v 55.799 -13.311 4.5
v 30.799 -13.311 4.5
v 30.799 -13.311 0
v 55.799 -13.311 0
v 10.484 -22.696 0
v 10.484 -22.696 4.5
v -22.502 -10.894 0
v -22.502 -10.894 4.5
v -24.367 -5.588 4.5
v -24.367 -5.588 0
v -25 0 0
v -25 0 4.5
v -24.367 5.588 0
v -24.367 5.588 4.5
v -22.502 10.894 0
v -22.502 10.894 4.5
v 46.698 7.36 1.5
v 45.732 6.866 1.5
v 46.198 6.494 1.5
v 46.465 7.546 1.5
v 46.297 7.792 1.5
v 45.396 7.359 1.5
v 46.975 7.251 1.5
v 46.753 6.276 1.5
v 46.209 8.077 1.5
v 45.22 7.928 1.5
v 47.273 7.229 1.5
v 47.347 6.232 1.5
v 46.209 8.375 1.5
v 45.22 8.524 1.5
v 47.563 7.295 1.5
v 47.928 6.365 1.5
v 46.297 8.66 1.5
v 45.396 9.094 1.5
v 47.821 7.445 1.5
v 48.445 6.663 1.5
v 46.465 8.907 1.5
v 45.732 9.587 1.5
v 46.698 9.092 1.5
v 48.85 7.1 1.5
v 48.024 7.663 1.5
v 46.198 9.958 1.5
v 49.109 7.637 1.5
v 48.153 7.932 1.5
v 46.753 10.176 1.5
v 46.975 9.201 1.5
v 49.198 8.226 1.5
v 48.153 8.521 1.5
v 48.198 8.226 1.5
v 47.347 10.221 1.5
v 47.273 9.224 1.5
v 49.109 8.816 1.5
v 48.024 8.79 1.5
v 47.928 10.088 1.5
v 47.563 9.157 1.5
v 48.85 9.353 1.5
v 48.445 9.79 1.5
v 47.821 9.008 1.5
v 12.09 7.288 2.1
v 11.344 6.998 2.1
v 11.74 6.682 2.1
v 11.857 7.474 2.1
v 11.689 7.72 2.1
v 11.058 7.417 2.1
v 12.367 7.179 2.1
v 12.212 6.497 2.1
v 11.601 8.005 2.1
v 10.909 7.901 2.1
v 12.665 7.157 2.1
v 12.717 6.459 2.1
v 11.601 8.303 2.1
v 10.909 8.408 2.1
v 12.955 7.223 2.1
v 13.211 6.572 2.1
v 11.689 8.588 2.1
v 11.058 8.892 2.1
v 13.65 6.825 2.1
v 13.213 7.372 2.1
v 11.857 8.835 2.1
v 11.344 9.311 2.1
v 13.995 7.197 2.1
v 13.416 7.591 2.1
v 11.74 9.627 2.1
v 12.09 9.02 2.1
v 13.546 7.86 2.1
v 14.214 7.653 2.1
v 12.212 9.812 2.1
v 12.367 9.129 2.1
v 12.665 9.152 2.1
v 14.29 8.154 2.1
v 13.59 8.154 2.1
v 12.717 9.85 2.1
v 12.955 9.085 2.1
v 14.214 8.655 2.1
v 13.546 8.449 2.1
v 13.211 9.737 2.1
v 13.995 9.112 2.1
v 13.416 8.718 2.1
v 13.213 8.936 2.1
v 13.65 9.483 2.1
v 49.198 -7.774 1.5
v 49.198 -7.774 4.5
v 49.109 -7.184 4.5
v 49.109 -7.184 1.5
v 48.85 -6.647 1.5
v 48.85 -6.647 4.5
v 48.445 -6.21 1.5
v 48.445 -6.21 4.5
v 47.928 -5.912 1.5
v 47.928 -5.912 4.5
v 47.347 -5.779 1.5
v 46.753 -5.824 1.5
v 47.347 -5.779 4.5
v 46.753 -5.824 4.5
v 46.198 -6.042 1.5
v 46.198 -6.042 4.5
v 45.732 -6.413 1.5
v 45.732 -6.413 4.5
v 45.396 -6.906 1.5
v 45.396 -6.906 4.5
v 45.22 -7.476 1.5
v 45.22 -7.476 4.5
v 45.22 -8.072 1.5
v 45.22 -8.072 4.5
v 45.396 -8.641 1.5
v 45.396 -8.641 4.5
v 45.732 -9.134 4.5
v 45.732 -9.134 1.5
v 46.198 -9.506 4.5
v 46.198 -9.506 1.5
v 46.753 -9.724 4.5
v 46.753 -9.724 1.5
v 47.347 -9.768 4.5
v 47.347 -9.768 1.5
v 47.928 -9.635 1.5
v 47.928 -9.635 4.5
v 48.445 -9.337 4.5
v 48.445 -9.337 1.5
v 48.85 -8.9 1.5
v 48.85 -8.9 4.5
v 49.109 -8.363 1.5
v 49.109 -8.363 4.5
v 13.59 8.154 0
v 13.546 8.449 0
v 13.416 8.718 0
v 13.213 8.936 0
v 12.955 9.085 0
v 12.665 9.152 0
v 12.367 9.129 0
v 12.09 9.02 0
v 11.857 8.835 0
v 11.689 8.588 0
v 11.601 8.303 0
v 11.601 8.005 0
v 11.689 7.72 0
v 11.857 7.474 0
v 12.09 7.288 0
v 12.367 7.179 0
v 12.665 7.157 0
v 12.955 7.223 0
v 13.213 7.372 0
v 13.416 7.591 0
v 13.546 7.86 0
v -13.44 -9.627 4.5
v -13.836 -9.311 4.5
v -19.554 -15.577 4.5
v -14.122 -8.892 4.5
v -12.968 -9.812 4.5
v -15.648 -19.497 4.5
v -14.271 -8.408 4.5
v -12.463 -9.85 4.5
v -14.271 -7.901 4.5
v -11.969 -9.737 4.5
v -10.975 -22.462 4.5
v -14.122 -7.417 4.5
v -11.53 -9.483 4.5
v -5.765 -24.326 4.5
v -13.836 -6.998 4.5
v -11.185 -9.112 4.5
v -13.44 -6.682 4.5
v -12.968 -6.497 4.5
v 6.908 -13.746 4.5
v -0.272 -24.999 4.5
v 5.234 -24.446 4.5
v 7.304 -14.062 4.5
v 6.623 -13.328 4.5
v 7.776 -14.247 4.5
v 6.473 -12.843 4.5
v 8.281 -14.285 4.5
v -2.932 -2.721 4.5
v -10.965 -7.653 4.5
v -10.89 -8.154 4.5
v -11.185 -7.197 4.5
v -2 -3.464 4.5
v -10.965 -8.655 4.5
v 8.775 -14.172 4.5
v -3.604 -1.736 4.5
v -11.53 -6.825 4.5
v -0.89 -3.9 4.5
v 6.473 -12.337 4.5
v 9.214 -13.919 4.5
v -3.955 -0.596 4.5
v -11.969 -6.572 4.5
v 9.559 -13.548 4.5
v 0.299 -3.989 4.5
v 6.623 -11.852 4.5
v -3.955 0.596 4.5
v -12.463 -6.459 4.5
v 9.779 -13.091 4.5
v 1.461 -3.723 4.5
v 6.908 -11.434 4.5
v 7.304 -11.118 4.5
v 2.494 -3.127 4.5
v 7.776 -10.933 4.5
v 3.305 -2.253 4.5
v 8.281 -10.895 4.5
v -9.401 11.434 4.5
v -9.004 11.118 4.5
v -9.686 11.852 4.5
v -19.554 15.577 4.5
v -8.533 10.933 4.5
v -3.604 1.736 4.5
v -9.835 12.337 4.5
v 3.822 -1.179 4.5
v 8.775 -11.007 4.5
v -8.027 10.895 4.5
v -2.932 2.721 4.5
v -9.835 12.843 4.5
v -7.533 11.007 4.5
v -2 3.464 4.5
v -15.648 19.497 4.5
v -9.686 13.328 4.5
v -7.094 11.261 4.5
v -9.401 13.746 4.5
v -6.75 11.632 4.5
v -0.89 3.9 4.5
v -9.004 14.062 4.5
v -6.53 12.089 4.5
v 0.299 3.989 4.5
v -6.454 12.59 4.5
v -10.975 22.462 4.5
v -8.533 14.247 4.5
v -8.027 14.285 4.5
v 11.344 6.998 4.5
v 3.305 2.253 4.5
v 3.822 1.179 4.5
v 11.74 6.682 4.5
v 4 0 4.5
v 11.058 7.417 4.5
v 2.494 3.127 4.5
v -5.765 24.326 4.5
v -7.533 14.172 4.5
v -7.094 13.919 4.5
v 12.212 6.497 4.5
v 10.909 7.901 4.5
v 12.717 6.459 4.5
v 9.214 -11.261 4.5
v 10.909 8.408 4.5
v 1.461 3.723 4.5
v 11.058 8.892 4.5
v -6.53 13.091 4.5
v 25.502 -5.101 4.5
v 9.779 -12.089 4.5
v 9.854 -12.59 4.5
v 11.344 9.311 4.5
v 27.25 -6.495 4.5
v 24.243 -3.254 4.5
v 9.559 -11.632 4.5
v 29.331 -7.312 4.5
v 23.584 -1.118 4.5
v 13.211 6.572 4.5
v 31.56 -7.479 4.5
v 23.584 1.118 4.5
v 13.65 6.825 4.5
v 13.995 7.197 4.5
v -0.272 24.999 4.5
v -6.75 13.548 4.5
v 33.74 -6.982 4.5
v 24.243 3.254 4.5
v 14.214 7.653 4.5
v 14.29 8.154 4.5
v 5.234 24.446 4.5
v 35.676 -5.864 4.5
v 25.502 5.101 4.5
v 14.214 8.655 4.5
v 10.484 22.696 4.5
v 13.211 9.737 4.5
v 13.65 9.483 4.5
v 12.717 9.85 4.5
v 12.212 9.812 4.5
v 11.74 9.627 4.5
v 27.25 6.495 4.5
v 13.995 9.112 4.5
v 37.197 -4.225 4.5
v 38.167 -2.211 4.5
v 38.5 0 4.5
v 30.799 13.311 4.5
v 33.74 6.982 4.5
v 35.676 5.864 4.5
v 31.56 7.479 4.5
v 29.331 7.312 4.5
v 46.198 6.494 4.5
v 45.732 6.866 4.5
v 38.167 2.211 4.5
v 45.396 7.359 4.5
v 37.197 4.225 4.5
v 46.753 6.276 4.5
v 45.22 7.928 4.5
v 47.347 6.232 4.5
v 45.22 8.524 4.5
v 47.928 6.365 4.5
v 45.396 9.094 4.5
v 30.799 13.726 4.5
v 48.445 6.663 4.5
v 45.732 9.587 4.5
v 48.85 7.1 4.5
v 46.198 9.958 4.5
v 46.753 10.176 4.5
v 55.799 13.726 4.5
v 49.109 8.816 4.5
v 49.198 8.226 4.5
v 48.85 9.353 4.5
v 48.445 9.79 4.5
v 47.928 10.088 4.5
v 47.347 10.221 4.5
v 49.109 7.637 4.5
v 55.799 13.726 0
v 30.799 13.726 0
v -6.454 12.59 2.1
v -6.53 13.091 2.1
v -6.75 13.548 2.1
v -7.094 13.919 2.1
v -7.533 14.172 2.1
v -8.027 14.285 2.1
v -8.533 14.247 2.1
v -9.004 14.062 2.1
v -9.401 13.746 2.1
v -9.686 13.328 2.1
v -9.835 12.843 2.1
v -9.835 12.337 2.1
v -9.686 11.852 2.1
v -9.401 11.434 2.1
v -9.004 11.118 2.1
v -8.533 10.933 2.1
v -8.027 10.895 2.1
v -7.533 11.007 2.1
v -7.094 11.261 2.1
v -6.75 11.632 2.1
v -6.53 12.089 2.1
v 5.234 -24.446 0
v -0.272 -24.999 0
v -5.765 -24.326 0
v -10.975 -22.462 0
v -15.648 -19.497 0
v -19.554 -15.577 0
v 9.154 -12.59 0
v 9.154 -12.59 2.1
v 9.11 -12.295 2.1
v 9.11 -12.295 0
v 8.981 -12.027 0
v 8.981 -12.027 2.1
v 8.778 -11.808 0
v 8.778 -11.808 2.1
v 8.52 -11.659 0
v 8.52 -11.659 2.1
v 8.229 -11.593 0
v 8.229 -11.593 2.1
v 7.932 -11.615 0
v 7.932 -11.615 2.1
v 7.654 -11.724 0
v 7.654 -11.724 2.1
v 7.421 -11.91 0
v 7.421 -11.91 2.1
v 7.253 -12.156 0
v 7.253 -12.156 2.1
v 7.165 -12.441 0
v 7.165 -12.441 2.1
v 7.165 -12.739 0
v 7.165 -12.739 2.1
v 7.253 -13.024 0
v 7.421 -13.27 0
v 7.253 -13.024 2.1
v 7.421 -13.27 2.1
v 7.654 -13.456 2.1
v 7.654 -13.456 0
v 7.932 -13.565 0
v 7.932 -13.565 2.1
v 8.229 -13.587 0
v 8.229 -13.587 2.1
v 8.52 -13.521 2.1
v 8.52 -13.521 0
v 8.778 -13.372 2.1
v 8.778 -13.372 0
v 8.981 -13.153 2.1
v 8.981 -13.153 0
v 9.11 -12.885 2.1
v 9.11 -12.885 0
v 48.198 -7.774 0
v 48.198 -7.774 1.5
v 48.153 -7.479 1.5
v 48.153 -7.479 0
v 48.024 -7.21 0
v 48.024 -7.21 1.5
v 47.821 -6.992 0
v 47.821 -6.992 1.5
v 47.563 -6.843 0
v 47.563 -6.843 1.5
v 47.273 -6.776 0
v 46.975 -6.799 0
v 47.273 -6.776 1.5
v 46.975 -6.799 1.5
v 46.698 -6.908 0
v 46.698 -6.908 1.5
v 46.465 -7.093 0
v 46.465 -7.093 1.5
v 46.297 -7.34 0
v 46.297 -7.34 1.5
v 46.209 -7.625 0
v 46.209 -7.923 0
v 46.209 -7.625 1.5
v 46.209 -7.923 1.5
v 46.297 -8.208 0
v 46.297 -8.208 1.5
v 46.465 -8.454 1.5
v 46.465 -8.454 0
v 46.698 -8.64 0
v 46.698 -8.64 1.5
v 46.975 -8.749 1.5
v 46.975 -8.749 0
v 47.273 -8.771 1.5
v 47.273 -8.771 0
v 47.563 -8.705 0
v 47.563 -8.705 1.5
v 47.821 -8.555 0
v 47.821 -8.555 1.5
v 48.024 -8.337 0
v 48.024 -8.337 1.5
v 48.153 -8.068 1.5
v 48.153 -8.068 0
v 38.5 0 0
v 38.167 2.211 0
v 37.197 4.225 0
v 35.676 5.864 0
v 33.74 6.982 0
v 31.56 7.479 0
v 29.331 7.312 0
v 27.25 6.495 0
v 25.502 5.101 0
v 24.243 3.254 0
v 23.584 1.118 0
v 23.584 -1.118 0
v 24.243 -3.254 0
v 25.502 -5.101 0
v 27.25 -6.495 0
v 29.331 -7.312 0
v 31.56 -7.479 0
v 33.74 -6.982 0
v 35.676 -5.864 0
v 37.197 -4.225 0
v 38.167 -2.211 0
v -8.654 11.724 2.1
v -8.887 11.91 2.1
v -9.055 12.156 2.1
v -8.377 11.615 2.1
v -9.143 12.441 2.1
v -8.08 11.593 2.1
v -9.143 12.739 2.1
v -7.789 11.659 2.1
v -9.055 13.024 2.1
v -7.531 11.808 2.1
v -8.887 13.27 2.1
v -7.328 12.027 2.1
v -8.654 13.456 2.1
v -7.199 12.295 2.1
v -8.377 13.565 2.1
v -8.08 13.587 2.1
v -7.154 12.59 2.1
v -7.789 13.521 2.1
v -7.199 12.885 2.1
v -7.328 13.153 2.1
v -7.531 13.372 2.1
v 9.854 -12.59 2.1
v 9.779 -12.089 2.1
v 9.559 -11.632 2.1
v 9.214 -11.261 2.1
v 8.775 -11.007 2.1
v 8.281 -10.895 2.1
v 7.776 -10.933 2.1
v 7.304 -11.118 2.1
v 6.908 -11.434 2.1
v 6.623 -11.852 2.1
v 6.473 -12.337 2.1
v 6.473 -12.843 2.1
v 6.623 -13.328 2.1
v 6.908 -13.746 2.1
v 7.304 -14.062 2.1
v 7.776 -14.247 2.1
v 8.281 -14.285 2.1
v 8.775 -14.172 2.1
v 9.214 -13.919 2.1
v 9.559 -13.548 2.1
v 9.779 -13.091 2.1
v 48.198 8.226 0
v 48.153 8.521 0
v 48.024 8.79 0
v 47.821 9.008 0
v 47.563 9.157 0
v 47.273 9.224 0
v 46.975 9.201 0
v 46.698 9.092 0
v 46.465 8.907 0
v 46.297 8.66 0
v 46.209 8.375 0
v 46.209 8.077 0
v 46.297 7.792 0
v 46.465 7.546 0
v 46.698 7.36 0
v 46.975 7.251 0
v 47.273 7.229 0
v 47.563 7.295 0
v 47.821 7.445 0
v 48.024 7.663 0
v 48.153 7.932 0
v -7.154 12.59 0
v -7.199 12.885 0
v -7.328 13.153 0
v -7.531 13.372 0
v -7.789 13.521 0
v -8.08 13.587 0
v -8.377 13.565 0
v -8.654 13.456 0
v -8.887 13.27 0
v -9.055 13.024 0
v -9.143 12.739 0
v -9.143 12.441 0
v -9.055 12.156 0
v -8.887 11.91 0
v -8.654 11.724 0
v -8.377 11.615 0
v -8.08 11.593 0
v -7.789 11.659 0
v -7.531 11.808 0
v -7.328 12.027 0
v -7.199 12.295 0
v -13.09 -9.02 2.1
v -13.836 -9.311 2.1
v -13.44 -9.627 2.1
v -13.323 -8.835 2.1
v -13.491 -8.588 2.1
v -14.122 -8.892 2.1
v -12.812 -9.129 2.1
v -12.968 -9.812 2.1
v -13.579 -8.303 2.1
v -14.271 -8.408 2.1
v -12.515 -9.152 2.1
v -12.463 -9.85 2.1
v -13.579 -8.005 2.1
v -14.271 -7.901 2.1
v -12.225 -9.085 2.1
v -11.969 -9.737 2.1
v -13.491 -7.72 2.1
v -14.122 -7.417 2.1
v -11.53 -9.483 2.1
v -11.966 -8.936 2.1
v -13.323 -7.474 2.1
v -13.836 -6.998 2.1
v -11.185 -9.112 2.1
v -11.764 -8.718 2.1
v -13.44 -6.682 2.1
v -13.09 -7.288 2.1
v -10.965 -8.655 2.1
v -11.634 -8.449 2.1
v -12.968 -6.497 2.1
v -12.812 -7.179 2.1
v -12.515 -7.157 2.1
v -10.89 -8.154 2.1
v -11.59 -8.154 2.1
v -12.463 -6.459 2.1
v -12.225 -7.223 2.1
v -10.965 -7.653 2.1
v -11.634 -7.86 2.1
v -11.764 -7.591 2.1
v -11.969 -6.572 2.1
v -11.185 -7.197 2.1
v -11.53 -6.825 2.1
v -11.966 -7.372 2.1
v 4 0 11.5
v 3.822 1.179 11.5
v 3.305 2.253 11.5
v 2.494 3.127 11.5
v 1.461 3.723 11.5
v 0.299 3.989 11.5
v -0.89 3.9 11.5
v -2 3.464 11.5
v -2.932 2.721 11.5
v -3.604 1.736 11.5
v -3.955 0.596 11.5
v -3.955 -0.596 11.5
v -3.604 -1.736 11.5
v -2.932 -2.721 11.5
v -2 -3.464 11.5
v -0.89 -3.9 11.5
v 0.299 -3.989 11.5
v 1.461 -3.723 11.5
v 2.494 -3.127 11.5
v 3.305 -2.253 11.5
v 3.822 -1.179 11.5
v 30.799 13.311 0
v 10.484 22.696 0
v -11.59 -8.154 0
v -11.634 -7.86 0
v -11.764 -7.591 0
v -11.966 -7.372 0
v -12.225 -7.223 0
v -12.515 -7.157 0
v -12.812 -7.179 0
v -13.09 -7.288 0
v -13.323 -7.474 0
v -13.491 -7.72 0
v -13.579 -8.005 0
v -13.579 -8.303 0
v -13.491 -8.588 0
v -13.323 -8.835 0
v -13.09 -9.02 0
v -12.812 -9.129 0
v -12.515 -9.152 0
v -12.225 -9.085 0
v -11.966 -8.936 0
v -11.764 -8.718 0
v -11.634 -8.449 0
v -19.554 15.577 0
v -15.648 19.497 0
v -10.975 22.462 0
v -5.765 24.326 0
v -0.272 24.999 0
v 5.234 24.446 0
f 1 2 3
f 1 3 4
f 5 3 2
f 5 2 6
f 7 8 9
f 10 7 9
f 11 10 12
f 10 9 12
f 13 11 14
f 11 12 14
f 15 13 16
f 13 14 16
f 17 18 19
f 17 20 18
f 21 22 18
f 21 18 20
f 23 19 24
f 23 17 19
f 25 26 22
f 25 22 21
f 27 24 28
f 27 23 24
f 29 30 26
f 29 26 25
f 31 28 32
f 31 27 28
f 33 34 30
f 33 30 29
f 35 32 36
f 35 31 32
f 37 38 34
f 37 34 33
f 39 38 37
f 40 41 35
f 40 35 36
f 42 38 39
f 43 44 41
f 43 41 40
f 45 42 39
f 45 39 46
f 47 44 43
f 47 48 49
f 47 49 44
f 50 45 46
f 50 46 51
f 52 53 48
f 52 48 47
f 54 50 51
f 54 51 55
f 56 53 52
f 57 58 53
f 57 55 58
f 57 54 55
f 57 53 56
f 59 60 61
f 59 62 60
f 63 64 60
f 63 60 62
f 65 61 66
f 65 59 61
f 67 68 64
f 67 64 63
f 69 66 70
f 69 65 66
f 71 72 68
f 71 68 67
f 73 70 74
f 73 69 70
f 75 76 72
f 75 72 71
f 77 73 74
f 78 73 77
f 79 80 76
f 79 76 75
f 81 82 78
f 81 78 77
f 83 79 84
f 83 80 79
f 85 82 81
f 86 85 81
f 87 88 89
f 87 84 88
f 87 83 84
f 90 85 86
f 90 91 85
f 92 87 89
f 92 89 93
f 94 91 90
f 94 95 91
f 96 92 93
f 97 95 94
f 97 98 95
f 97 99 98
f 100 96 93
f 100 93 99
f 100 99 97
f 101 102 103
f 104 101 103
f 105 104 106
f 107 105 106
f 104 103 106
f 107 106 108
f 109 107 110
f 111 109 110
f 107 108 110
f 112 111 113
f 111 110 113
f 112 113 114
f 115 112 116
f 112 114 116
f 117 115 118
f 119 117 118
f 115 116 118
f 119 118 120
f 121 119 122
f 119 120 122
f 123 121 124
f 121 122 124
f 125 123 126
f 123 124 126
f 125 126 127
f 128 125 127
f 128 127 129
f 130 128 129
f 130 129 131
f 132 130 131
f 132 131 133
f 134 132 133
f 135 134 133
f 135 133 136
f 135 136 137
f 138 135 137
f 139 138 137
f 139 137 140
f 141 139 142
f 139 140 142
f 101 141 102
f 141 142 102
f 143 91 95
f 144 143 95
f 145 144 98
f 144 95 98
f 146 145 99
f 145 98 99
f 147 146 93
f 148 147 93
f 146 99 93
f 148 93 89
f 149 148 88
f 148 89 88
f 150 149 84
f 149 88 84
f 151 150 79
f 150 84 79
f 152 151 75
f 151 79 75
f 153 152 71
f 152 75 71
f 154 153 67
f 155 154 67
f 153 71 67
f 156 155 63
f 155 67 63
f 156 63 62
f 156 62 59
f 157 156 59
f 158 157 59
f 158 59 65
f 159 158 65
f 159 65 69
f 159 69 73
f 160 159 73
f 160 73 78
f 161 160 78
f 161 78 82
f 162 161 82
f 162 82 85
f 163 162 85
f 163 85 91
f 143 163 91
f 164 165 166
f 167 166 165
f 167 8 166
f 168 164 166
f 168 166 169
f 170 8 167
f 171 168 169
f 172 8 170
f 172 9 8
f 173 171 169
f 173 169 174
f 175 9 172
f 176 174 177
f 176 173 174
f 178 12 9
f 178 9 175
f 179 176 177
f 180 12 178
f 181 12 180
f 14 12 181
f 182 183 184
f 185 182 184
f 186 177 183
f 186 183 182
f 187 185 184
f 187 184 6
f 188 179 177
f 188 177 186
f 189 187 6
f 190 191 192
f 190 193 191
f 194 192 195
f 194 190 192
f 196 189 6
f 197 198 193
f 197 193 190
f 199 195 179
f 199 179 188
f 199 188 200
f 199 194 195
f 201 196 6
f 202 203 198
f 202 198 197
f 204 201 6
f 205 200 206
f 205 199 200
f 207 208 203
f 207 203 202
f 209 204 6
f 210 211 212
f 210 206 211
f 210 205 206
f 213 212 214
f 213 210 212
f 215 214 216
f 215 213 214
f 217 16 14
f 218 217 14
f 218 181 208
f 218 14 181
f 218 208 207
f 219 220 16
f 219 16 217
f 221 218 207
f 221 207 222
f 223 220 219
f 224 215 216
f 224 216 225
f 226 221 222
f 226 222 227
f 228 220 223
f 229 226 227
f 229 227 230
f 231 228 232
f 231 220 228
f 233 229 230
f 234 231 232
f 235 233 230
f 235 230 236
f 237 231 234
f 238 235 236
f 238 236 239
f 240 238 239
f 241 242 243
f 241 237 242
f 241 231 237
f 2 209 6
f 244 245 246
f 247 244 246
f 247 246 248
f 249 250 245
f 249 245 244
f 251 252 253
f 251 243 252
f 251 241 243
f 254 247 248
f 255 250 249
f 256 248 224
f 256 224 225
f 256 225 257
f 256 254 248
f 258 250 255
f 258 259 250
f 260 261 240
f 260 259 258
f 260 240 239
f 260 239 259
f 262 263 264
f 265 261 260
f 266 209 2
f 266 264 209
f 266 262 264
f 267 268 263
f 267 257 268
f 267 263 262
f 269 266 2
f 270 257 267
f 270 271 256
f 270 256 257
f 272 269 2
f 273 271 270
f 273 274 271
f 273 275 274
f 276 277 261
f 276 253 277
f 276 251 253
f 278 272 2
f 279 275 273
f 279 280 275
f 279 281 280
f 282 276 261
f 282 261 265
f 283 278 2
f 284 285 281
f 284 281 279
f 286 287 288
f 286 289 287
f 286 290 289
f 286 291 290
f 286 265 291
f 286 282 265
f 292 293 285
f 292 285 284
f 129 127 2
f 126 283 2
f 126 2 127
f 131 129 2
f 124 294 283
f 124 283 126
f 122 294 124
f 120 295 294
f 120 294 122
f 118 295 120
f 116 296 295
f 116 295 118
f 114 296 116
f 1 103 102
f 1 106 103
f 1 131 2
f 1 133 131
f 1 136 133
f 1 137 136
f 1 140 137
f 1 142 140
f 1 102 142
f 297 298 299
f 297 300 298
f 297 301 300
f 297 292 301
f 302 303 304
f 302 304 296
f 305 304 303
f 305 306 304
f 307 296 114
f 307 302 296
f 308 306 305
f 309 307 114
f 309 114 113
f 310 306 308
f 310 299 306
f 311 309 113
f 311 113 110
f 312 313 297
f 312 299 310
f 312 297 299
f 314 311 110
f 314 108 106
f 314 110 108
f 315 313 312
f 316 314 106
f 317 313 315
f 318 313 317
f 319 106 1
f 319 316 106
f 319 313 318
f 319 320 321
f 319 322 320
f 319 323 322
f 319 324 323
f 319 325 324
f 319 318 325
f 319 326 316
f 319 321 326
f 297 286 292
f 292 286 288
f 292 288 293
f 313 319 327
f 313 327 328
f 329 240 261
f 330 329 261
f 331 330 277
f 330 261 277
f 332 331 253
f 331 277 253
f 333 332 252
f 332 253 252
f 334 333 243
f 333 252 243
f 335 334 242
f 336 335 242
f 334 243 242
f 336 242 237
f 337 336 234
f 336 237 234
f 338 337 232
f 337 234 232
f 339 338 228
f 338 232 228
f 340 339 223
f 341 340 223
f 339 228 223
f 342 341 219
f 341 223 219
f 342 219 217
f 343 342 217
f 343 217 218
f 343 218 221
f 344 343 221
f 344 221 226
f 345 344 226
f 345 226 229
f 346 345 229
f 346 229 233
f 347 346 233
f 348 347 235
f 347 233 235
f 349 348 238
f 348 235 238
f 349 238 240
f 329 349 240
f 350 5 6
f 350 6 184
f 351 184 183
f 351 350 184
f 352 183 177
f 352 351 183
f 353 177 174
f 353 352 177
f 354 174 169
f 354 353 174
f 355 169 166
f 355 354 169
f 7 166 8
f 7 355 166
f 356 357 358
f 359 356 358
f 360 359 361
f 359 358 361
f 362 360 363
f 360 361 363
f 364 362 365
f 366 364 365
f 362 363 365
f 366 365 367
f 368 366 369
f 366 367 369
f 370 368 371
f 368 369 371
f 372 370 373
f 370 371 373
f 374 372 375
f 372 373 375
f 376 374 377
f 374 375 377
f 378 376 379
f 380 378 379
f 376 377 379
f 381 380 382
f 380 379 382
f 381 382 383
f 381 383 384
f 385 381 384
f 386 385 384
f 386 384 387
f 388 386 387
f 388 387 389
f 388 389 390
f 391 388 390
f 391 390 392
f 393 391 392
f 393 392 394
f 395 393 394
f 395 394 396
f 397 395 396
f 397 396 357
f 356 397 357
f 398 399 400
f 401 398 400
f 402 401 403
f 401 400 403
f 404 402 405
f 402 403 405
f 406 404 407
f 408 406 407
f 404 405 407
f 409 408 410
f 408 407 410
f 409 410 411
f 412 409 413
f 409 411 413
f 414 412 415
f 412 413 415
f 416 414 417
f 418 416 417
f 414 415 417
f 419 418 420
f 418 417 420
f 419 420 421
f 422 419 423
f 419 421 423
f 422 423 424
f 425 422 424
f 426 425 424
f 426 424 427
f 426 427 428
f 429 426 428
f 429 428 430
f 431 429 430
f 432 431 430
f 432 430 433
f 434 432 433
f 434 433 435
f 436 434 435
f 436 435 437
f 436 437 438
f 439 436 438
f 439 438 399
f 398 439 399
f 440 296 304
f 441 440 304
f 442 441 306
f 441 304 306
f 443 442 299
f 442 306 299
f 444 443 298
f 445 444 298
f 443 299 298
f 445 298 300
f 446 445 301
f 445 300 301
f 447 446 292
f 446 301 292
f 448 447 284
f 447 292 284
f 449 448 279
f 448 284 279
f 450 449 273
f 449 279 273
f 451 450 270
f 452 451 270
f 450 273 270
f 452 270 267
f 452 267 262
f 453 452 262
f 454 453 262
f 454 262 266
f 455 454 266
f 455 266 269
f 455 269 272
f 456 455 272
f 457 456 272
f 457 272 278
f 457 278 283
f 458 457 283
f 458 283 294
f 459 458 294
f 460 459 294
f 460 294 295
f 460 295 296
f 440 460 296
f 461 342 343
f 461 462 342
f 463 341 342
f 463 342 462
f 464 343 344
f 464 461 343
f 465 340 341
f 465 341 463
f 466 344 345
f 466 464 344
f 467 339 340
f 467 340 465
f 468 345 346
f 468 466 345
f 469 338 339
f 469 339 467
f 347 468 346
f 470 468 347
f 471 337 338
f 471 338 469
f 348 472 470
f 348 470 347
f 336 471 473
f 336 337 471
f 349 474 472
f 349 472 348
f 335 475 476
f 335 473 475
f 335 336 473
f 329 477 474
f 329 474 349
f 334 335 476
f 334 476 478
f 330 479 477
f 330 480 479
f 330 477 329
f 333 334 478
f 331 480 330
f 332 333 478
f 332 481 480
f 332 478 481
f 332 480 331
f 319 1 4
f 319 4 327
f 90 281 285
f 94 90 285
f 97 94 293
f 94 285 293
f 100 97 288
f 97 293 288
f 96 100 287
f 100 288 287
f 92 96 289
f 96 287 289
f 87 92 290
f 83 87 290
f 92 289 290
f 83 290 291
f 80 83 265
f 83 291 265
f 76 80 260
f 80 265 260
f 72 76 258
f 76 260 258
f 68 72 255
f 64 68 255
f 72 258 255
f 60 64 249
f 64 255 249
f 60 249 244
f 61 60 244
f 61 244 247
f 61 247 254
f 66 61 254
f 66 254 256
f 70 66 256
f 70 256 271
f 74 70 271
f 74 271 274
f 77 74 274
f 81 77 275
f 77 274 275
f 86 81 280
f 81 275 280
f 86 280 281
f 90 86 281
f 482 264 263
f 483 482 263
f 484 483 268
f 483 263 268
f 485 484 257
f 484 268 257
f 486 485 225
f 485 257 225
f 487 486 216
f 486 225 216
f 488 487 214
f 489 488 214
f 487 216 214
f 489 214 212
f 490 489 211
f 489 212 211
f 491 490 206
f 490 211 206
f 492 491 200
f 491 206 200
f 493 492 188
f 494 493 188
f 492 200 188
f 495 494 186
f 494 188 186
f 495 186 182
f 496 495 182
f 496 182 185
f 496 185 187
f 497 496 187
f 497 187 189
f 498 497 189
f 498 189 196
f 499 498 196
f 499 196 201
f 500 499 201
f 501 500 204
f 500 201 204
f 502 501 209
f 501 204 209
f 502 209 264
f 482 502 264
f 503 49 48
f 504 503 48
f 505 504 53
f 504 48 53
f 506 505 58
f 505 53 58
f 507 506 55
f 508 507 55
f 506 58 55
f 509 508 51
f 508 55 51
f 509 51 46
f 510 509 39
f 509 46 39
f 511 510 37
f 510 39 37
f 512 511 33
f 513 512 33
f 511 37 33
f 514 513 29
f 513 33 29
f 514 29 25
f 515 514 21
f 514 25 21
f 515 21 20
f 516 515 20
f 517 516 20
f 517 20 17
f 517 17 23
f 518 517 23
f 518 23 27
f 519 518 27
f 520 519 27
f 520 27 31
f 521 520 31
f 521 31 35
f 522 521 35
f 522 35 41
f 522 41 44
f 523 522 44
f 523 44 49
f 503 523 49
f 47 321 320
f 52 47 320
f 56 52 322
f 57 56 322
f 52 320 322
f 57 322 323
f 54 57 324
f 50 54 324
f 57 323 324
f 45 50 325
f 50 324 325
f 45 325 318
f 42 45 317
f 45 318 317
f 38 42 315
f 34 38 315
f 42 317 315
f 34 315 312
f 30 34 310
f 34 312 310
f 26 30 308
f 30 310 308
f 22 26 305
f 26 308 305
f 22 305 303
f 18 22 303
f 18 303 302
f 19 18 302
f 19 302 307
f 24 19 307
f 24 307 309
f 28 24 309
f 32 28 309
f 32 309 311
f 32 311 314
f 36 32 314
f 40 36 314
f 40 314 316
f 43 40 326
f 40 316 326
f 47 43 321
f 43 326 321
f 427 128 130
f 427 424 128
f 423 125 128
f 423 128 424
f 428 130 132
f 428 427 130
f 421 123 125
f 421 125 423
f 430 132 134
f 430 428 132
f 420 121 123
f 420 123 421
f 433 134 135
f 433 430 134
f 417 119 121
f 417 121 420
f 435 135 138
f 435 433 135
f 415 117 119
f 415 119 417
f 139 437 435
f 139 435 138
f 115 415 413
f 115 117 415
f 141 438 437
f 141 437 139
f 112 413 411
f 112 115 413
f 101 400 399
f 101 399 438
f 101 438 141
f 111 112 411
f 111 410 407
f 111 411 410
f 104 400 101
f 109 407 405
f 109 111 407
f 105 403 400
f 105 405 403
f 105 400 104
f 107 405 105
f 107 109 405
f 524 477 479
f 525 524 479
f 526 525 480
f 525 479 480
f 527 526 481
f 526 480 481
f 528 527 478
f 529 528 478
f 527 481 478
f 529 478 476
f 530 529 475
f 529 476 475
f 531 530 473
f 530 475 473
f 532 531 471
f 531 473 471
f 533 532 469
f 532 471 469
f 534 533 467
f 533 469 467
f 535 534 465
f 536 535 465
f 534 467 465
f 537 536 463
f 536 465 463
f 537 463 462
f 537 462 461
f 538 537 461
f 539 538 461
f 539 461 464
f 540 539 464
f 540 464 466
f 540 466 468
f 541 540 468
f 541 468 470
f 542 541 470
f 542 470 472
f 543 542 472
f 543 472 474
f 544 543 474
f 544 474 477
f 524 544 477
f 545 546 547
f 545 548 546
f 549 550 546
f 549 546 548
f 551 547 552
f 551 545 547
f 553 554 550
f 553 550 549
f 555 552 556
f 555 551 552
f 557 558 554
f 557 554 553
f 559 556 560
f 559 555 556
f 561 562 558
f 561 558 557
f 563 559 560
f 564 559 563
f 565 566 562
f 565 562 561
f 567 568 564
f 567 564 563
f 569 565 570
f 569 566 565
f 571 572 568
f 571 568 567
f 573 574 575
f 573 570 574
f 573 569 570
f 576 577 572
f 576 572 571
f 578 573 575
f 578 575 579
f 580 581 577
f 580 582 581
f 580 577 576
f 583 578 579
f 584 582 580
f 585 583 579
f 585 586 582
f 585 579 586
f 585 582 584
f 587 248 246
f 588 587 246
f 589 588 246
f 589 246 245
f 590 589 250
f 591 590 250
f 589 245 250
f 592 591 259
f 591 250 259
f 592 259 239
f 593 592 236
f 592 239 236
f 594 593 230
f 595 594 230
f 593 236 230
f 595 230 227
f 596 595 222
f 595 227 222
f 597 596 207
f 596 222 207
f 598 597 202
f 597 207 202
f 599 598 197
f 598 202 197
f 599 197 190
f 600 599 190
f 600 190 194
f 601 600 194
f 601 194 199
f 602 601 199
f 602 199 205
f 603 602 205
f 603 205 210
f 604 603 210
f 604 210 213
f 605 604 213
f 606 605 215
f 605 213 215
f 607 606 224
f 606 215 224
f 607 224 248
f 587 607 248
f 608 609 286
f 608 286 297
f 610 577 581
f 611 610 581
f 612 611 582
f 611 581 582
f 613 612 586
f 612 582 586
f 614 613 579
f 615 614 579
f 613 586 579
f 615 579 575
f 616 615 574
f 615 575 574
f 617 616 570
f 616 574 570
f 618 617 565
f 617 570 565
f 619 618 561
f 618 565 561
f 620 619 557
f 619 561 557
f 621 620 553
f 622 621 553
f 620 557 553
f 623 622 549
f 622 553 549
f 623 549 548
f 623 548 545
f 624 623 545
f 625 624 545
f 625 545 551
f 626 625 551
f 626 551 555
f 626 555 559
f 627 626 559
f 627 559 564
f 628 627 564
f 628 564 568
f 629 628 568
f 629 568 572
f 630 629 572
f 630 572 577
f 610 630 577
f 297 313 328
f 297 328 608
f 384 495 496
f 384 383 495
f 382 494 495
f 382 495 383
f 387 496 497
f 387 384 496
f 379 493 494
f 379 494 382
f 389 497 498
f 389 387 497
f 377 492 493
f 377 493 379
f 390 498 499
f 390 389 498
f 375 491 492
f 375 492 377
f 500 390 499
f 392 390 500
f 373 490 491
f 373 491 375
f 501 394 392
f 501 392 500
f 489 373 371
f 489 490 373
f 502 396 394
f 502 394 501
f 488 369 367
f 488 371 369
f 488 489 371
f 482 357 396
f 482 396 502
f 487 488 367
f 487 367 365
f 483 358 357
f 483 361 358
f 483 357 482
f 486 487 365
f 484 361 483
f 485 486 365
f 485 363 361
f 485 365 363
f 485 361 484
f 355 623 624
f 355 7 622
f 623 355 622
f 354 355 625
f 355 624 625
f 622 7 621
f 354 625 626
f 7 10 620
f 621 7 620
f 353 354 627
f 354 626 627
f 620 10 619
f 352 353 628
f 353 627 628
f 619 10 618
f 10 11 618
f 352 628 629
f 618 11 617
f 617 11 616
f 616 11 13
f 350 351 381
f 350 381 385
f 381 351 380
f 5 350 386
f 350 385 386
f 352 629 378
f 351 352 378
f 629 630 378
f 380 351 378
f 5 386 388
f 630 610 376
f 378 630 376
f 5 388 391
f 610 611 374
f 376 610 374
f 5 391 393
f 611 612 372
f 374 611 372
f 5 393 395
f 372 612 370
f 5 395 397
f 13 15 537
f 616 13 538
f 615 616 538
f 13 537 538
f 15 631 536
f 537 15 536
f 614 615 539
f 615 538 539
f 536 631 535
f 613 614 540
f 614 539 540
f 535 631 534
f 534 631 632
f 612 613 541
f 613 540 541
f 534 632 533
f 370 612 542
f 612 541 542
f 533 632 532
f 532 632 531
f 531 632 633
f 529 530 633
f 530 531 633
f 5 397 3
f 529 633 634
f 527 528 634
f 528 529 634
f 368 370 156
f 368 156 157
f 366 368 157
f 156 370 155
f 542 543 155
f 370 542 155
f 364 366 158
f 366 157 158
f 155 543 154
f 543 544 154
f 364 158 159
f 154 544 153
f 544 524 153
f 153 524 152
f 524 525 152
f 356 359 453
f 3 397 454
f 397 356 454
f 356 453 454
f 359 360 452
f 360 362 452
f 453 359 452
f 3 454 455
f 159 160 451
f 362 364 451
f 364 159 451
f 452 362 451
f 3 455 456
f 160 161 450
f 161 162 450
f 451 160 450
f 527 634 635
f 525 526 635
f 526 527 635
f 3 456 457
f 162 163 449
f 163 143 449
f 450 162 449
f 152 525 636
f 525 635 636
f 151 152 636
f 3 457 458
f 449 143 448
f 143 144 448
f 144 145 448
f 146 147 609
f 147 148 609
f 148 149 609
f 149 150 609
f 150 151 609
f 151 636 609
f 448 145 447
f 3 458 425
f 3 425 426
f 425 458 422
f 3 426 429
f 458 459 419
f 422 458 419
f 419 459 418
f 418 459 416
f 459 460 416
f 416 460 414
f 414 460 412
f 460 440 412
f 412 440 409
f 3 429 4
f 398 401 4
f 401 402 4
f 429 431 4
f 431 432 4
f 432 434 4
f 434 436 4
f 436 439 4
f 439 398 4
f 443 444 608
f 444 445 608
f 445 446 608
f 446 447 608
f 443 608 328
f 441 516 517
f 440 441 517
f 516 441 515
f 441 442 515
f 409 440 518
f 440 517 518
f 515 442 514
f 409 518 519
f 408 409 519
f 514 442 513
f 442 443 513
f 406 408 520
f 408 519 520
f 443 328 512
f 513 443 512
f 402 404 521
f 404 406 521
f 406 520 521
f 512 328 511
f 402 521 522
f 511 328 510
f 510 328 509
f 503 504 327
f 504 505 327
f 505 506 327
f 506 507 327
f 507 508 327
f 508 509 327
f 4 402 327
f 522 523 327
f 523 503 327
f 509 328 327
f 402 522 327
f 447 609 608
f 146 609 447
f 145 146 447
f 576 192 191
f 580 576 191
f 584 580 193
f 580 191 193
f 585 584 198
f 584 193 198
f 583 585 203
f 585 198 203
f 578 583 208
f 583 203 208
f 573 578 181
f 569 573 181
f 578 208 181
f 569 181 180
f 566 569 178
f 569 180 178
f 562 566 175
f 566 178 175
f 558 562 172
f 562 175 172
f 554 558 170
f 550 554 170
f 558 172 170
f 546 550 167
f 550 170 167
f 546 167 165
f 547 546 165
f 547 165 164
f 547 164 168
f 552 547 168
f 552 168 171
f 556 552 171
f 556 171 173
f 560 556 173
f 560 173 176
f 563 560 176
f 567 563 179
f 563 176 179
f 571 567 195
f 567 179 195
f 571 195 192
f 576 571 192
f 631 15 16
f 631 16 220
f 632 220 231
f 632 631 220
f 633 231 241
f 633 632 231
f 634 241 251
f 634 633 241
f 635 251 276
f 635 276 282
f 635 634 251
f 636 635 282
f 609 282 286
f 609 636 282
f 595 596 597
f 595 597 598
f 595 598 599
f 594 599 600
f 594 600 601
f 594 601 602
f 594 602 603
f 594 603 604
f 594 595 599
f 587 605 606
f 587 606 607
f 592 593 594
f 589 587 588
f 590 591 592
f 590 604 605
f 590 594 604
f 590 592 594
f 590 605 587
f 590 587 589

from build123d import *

# Parameters (mm, degrees)
BOSS_EXTRUDE1_DEPTH = 4.5
SKETCH2_R           = 7.5
CUT_EXTRUDE1_DEPTH  = 50.942466899
SKETCH3_R           = 4
BOSS_EXTRUDE2_DEPTH = 7
BOSS_EXTRUDE3_DEPTH = 4.5
FILLET1_R           = 10
CUT_EXTRUDE4_DEPTH  = 62.754464971
SKETCH9_R           = 1
CUT_EXTRUDE5_DEPTH  = 62.182594482
SKETCH10_R          = 1.7
CUT_EXTRUDE6_DEPTH  = 2.4
CUT_EXTRUDE7_DEPTH  = 4.5
FILLET2_R           = 10
CUT_EXTRUDE8_DEPTH  = 51.658168147
SKETCH20_R          = 1
BOSS_EXTRUDE4_DEPTH = 4.5
SKETCH21_R          = 2
CUT_EXTRUDE9_DEPTH  = 3


with BuildPart() as part:
    # Sketch1 → Boss-Extrude1 (new body)
    with BuildSketch(Plane.XY):
        with BuildLine():
            Line((10.483870968, 22.695560128), (36.032258065, 10.893868862))
            ThreePointArc((36.032258065, 10.893868862), (43, 0), (36.032258065, -10.893868862))
            Line((36.032258065, -10.893868862), (10.483870968, -22.695560128))
            ThreePointArc((10.483870968, -22.695560128), (-25, 0), (10.483870968, 22.695560128))
        make_face()
    extrude(amount=BOSS_EXTRUDE1_DEPTH)

    # Sketch2 → Cut-Extrude1 (cut, through all)
    with BuildSketch(Plane.XY.offset(4.5)):
        with Locations((31, 0)):
            Circle(SKETCH2_R)
    extrude(amount=-CUT_EXTRUDE1_DEPTH, mode=Mode.SUBTRACT)

    # Sketch3 → Boss-Extrude2 (add)
    with BuildSketch(Plane.XY.offset(4.5)):
        Circle(SKETCH3_R)
    extrude(amount=BOSS_EXTRUDE2_DEPTH)

    # Sketch4 → Boss-Extrude3 (add)
    with BuildSketch(Plane(origin=(0, 0, 0), x_dir=(-1, 0, 0), z_dir=(0, 0, -1))):
        with BuildLine():
            Line((-36.032258065, 10.893868862), (-56.032258065, 10.893868862))
            Line((-56.032258065, 10.893868862), (-56.032258065, -10.893868862))
            Line((-56.032258065, -10.893868862), (-36.032258065, -10.893868862))
            ThreePointArc((-36.032258065, -10.893868862), (-43, 0), (-36.032258065, 10.893868862))
        make_face()
        with BuildLine():
            Line((22.501635968, 10.893868862), (42.501635968, 10.893868862))
            Line((42.501635968, 10.893868862), (42.501635968, -10.893868862))
            Line((42.501635968, -10.893868862), (22.501635968, -10.893868862))
            ThreePointArc((22.501635968, -10.893868862), (25, 0), (22.501635968, 10.893868862))
        make_face()
    extrude(amount=-BOSS_EXTRUDE3_DEPTH)

    # Fillet1
    fillet1_edges = [part.edges().sort_by_distance(p)[0] for p in [
        (56.032258065, 10.893868862, 2.25),
        (56.032258065, -10.893868862, 2.25),
        (-42.501635968, -10.893868862, 2.25),
        (-42.501635968, 10.893868862, 2.25),
    ]]
    fillet(fillet1_edges, radius=FILLET1_R)

    # Sketch8 → Cut-Extrude4 (cut, through all)
    with BuildSketch(Plane.XY.offset(4.5)):
        with BuildLine():
            Line((56.032258065, 0.893868862), (56.032258065, -0.893868862))
            ThreePointArc((56.032258065, -0.893868862), (55.873267798, -2.669967796), (55.401352579, -4.389590243))
            Line((55.401352579, -4.389590243), (55.401352579, 4.389590243))
            ThreePointArc((55.401352579, 4.389590243), (55.873267798, 2.669967796), (56.032258065, 0.893868862))
        make_face()
        with BuildLine():
            Line((-42.501635968, -0.893868862), (-42.501635968, 0.893868862))
            ThreePointArc((-42.501635968, 0.893868862), (-42.342645701, 2.669967796), (-41.870730482, 4.389590243))
            Line((-41.870730482, 4.389590243), (-41.870730482, -4.389590243))
            ThreePointArc((-41.870730482, -4.389590243), (-42.342645701, -2.669967796), (-42.501635968, -0.893868862))
        make_face()
    extrude(amount=-CUT_EXTRUDE4_DEPTH, mode=Mode.SUBTRACT)

    # Sketch9 → Cut-Extrude5 (cut, through all)
    with BuildSketch(Plane.XY.offset(4.5)):
        with Locations((-8.154330676, 12.589951995)):
            Circle(SKETCH9_R)
        with Locations((12.589951995, 8.154330676)):
            Circle(SKETCH9_R)
        with Locations((8.154330676, -12.589951995)):
            Circle(SKETCH9_R)
        with Locations((-12.589951995, -8.154330676)):
            Circle(SKETCH9_R)
    extrude(amount=-CUT_EXTRUDE5_DEPTH, mode=Mode.SUBTRACT)

    # Sketch10 → Cut-Extrude6 (cut)
    with BuildSketch(Plane.XY.offset(4.5)):
        with Locations((-8.154330676, 12.589951995)):
            Circle(SKETCH10_R)
        with Locations((12.589951995, 8.154330676)):
            Circle(SKETCH10_R)
        with Locations((8.154330676, -12.589951995)):
            Circle(SKETCH10_R)
        with Locations((-12.589951995, -8.154330676)):
            Circle(SKETCH10_R)
    extrude(amount=-CUT_EXTRUDE6_DEPTH, mode=Mode.SUBTRACT)

    # Sketch11 → Cut-Extrude7 (cut)
    with BuildSketch(Plane(origin=(0, 0, 0), x_dir=(-1, 0, 0), z_dir=(0, 0, -1))):
        with BuildLine():
            Line((-40.960235838, 14.646128502), (-73.67178465, 18.9155259))
            Line((-73.67178465, 18.9155259), (-68.640309048, -15.675868866))
            Line((-68.640309048, -15.675868866), (-41.444996676, -13.212200821))
            ThreePointArc((-41.444996676, -13.212200821), (-43.493415761, 0.756825882), (-40.960235838, 14.646128502))
        make_face()
    extrude(amount=-CUT_EXTRUDE7_DEPTH, mode=Mode.SUBTRACT)

    # Fillet2
    # the kernel refuses this fillet: 10 mm, written as the material it takes off along each edge
    with BuildSketch(Plane(origin=(42.113817462, -10.893868862, 28.001897109), x_dir=(0.1443560651040101, 0.9895258088941827, 0), z_dir=(0, 0, -1))) as fillet2_piece_1:
        with BuildLine():
            CenterArc((8.32021185, -9.941449502), FILLET2_R, 83.796810377, 73.10182949)
            Line((-0.877909984, -6.017859982), (-1.061872421, -5.939388192))
            ThreePointArc((-1.061872421, -5.939388192), (-0.636860154, -2.980058778), (-0.197905162, 0.028871213))
            Line((-0.197905162, 0.028871213), (-0.02161094, 0.19882899))
            ThreePointArc((-0.02161094, 0.19882899), (4.700379422, 0.454694668), (9.422369784, 0.19882899))
            Line((9.422369784, 0.19882899), (9.400758844, 0))
        make_face()
    extrude(amount=51.503794219, mode=Mode.SUBTRACT)
    with BuildSketch(Plane(origin=(42.113817462, 10.893868862, 28.001897109), x_dir=(-1, 0, 0), z_dir=(0, 0, -1))) as fillet2_piece_2:
        with BuildLine():
            CenterArc((8.636247816, -9.668172893), FILLET2_R, 104.801368002, 73.10182949)
            Line((-1.357056556, -9.302293499), (-1.556922643, -9.294975911))
            ThreePointArc((-1.556922643, -9.294975911), (-1.128460387, -4.585508816), (-0.193626747, 0.050086753))
            Line((-0.193626747, 0.050086753), (0, 0.2))
            ThreePointArc((0, 0.2), (3.040779699, 0.2), (6.030465629, 0.193363458))
            Line((6.030465629, 0.193363458), (6.081559398, 0))
        make_face()
    extrude(amount=51.503794219, mode=Mode.SUBTRACT)

    # Sketch12 → Cut-Extrude8 (cut, through all)
    with BuildSketch(Plane.XY.offset(4.5)):
        with BuildLine():
            Line((-22.501635968, 10.893868862), (-42.592674389, 14.819498464))
            Line((-42.592674389, 14.819498464), (-48.148078041, -13.612584929))
            Line((-48.148078041, -13.612584929), (-27.427309778, -14.315310761))
            Line((-27.427309778, -14.315310761), (-22.501635968, -10.893868862))
            ThreePointArc((-22.501635968, -10.893868862), (-25, 0), (-22.501635968, 10.893868862))
        make_face()
    extrude(amount=-CUT_EXTRUDE8_DEPTH, mode=Mode.SUBTRACT)

    # Sketch20 → Boss-Extrude4 (add)
    with BuildSketch(Plane.XY.offset(4.5)):
        with BuildLine():
            Line((55.798644786, -13.311457412), (55.798644786, 13.726073795))
            Line((55.798644786, 13.726073795), (30.798644786, 13.726073795))
            Line((30.798644786, 13.726073795), (30.798644786, 13.311457412))
            Line((30.798644786, 13.311457412), (36.032258065, 10.893868862))
            ThreePointArc((36.032258065, 10.893868862), (41.287575846, 7.470998455), (43.470874018, 1.591575362))
            ThreePointArc((43.470874018, 1.591575362), (43.5, 0), (43.470874018, -1.591575362))
            ThreePointArc((43.470874018, -1.591575362), (41.287575846, -7.470998455), (36.032258065, -10.893868862))
            Line((36.032258065, -10.893868862), (30.798644786, -13.311457412))
            Line((30.798644786, -13.311457412), (55.798644786, -13.311457412))
        make_face()
        with Locations((47.197816856, -7.773648876)):
            Circle(SKETCH20_R, mode=Mode.SUBTRACT)
        with Locations((47.197816856, 8.226351124)):
            Circle(SKETCH20_R, mode=Mode.SUBTRACT)
    extrude(amount=-BOSS_EXTRUDE4_DEPTH)

    # Sketch21 → Cut-Extrude9 (cut)
    with BuildSketch(Plane.XY.offset(4.5)):
        with Locations((47.197816856, 8.226351124)):
            Circle(SKETCH21_R)
        with Locations((47.197816856, -7.773648876)):
            Circle(SKETCH21_R)
    extrude(amount=-CUT_EXTRUDE9_DEPTH, mode=Mode.SUBTRACT)


solid = part.part
